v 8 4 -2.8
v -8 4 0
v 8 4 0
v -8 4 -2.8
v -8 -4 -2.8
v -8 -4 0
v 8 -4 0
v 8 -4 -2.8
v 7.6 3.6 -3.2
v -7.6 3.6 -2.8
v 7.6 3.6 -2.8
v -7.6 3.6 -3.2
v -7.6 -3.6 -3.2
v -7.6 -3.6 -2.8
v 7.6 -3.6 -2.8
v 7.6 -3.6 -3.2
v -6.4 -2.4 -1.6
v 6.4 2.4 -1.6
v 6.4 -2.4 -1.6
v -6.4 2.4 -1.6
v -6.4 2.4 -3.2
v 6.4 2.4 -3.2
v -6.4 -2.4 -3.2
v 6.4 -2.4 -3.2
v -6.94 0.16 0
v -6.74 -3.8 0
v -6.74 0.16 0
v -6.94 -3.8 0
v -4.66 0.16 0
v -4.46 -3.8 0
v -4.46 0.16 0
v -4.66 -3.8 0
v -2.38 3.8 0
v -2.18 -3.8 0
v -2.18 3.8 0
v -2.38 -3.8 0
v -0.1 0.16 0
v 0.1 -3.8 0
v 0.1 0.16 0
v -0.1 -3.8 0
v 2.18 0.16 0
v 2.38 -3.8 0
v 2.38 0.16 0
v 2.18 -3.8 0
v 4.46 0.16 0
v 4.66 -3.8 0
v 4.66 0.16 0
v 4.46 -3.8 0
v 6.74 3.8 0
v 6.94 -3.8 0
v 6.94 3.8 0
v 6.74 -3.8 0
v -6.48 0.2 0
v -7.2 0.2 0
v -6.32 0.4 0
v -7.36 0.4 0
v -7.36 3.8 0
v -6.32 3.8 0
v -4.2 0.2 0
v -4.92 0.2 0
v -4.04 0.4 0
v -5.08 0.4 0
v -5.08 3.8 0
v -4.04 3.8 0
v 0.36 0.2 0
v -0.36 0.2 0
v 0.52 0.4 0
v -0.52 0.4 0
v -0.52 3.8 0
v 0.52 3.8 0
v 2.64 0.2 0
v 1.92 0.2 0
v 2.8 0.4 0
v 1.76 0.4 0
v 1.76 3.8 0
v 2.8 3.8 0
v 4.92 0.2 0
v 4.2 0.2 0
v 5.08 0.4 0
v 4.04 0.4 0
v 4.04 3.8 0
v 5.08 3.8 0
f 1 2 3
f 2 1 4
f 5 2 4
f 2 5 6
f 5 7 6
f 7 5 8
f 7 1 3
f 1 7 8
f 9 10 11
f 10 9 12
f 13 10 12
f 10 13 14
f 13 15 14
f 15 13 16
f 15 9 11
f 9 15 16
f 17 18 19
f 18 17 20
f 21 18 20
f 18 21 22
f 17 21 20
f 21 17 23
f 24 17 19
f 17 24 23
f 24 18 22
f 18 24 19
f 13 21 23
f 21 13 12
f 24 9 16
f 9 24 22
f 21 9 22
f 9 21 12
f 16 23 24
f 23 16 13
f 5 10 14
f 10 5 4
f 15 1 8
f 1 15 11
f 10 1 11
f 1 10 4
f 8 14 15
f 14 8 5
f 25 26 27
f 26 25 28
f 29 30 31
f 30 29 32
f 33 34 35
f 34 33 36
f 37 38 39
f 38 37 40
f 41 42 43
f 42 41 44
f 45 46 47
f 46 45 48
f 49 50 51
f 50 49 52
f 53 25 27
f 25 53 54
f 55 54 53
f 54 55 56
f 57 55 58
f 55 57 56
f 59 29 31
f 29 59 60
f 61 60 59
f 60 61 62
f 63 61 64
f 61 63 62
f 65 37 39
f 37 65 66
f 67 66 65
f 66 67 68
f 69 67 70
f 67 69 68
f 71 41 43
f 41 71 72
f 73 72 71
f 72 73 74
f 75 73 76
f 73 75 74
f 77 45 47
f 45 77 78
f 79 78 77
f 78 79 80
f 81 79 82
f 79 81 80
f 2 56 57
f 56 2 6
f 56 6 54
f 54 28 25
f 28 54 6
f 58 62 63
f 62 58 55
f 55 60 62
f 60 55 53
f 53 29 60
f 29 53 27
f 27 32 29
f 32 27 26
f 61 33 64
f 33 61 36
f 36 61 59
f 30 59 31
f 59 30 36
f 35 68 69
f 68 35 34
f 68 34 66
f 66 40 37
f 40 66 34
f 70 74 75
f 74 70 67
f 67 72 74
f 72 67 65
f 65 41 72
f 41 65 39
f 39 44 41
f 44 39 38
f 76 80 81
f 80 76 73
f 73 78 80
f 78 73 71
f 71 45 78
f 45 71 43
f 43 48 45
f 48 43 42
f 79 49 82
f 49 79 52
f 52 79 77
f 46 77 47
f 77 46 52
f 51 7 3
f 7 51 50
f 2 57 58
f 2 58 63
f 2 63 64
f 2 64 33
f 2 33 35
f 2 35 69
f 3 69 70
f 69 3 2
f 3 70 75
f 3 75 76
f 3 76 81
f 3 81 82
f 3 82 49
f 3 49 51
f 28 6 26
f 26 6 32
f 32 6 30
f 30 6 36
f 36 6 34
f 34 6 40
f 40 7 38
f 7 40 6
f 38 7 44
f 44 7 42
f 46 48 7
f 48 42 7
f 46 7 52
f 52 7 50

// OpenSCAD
// file: ../p/box5.scad
use <../lib.scad>
function ldraw_lib__box5() = [
// 0 Box with 5 Faces and All Edges
// 0 Name: box5.dat
// 0 Author: James Jessiman
// 0 !LDRAW_ORG Primitive UPDATE 2012-01
// 0 !LICENSE Licensed under CC BY 2.0 and CC BY 4.0 : see CAreadme.txt
// 
// 0 BFC CERTIFY CCW
  [0,"BFC","CERTIFY"],
  [0,"BFC","CCW"],
// 
// 0 !HISTORY 2002-04-03 [sbliss] Modified for BFC compliance
// 0 !HISTORY 2002-04-25 [PTadmin] Official Update 2002-02
// 0 !HISTORY 2007-06-24 [PTadmin] Header formatted for Contributor Agreement
// 0 !HISTORY 2008-07-01 [PTadmin] Official Update 2008-01
// 0 !HISTORY 2012-02-16 [Philo] Changed to CCW
// 0 !HISTORY 2012-03-30 [PTadmin] Official Update 2012-01
// 
// 
// 2 24 1 1 1 -1 1 1
  [2,24,1,1,1,-1,1,1],
// 2 24 -1 1 1 -1 1 -1
  [2,24,-1,1,1,-1,1,-1],
// 2 24 -1 1 -1 1 1 -1
  [2,24,-1,1,-1,1,1,-1],
// 2 24 1 1 -1 1 1 1
  [2,24,1,1,-1,1,1,1],
// 2 24 1 0 1 -1 0 1
  [2,24,1,0,1,-1,0,1],
// 2 24 -1 0 1 -1 0 -1
  [2,24,-1,0,1,-1,0,-1],
// 2 24 -1 0 -1 1 0 -1
  [2,24,-1,0,-1,1,0,-1],
// 2 24 1 0 -1 1 0 1
  [2,24,1,0,-1,1,0,1],
// 2 24 1 0 1 1 1 1
  [2,24,1,0,1,1,1,1],
// 2 24 -1 0 1 -1 1 1
  [2,24,-1,0,1,-1,1,1],
// 2 24 1 0 -1 1 1 -1
  [2,24,1,0,-1,1,1,-1],
// 2 24 -1 0 -1 -1 1 -1
  [2,24,-1,0,-1,-1,1,-1],
// 4 16 -1 1 1 1 1 1 1 1 -1 -1 1 -1
  [4,16,-1,1,1,1,1,1,1,1,-1,-1,1,-1],
// 4 16 -1 1 1 -1 0 1 1 0 1 1 1 1
  [4,16,-1,1,1,-1,0,1,1,0,1,1,1,1],
// 4 16 -1 1 -1 -1 0 -1 -1 0 1 -1 1 1
  [4,16,-1,1,-1,-1,0,-1,-1,0,1,-1,1,1],
// 4 16 1 1 -1 1 0 -1 -1 0 -1 -1 1 -1
  [4,16,1,1,-1,1,0,-1,-1,0,-1,-1,1,-1],
// 4 16 1 1 1 1 0 1 1 0 -1 1 1 -1
  [4,16,1,1,1,1,0,1,1,0,-1,1,1,-1],
];
module ldraw_lib__box5(step=0, col=false, unit=2/5, alt=false, line=0.2, solid=!$preview)
    makepoly(ldraw_lib__box5(), step=step, col=col, unit=unit, alt=alt, line=line, solid=solid);
ldraw_lib__box5(line=0.2);
// file: ../p/box4.scad
use <../lib.scad>
function ldraw_lib__box4() = [
// 0 Box with 4 Faces (2 Parallel Pairs) and All Edges
// 0 Name: box4.dat
// 0 Author: James Jessiman
// 0 !LDRAW_ORG Primitive UPDATE 2012-01
// 0 !LICENSE Licensed under CC BY 2.0 and CC BY 4.0 : see CAreadme.txt
// 
// 0 BFC CERTIFY CCW
  [0,"BFC","CERTIFY"],
  [0,"BFC","CCW"],
// 
// 0 !HISTORY 2002-04-03 [sbliss] Modified for BFC compliance
// 0 !HISTORY 2002-04-25 [PTadmin] Official Update 2002-02
// 0 !HISTORY 2007-06-24 [PTadmin] Header formatted for Contributor Agreement
// 0 !HISTORY 2008-07-01 [PTadmin] Official Update 2008-01
// 0 !HISTORY 2012-02-16 [Philo] Changed to CCW
// 0 !HISTORY 2012-03-30 [PTadmin] Official Update 2012-01
// 
// 
// 2 24 1 1 1 -1 1 1
  [2,24,1,1,1,-1,1,1],
// 2 24 -1 1 1 -1 1 -1
  [2,24,-1,1,1,-1,1,-1],
// 2 24 -1 1 -1 1 1 -1
  [2,24,-1,1,-1,1,1,-1],
// 2 24 1 1 -1 1 1 1
  [2,24,1,1,-1,1,1,1],
// 2 24 1 0 1 -1 0 1
  [2,24,1,0,1,-1,0,1],
// 2 24 -1 0 1 -1 0 -1
  [2,24,-1,0,1,-1,0,-1],
// 2 24 -1 0 -1 1 0 -1
  [2,24,-1,0,-1,1,0,-1],
// 2 24 1 0 -1 1 0 1
  [2,24,1,0,-1,1,0,1],
// 2 24 1 0 1 1 1 1
  [2,24,1,0,1,1,1,1],
// 2 24 -1 0 1 -1 1 1
  [2,24,-1,0,1,-1,1,1],
// 2 24 1 0 -1 1 1 -1
  [2,24,1,0,-1,1,1,-1],
// 2 24 -1 0 -1 -1 1 -1
  [2,24,-1,0,-1,-1,1,-1],
// 4 16 -1 1 1 -1 0 1 1 0 1 1 1 1
  [4,16,-1,1,1,-1,0,1,1,0,1,1,1,1],
// 4 16 -1 1 -1 -1 0 -1 -1 0 1 -1 1 1
  [4,16,-1,1,-1,-1,0,-1,-1,0,1,-1,1,1],
// 4 16 1 1 -1 1 0 -1 -1 0 -1 -1 1 -1
  [4,16,1,1,-1,1,0,-1,-1,0,-1,-1,1,-1],
// 4 16 1 1 1 1 0 1 1 0 -1 1 1 -1
  [4,16,1,1,1,1,0,1,1,0,-1,1,1,-1],
];
module ldraw_lib__box4(step=0, col=false, unit=2/5, alt=false, line=0.2, solid=!$preview)
    makepoly(ldraw_lib__box4(), step=step, col=col, unit=unit, alt=alt, line=line, solid=solid);
ldraw_lib__box4(line=0.2);
// file: s/3069bs01.scad
use <../../lib.scad>
use <../../p/box4.scad>
use <../../p/box5.scad>
function ldraw_lib__s__3069bs01() = [
// 0 ~Tile  1 x  2 with Groove without Top Face
// 0 Name: s\3069bs01.dat
// 0 Author: Santeri Piippo [arezey]
// 0 !LDRAW_ORG Subpart UPDATE 2010-02
// 0 !LICENSE Licensed under CC BY 2.0 and CC BY 4.0 : see CAreadme.txt
// 
// 0 BFC CERTIFY CCW
  [0,"BFC","CERTIFY"],
  [0,"BFC","CCW"],
// 
// 0 !HISTORY 2010-07-05 [PTadmin] Official Update 2010-02
// 
// 
// 1 16 0 0 0 20 0 0 0 7 0 0 0 10 box4.dat
  [1,16,0,0,0,20,0,0,0,7,0,0,0,10, ldraw_lib__box4()],
// 1 16 0 7 0 19 0 0 0 1 0 0 0 9 box4.dat
  [1,16,0,7,0,19,0,0,0,1,0,0,0,9, ldraw_lib__box4()],
// 0 BFC INVERTNEXT
  [0,"BFC","INVERTNEXT"],
// 1 16 0 8 0 16 0 0 0 -4 0 0 0 6 box5.dat
  [1,16,0,8,0,16,0,0,0,-4,0,0,0,6, ldraw_lib__box5()],
// 4 16 -19 8 9 -16 8 6 -16 8 -6 -19 8 -9
  [4,16,-19,8,9,-16,8,6,-16,8,-6,-19,8,-9],
// 4 16 19 8 -9 16 8 -6 16 8 6 19 8 9
  [4,16,19,8,-9,16,8,-6,16,8,6,19,8,9],
// 4 16 19 8 9 16 8 6 -16 8 6 -19 8 9
  [4,16,19,8,9,16,8,6,-16,8,6,-19,8,9],
// 4 16 -19 8 -9 -16 8 -6 16 8 -6 19 8 -9
  [4,16,-19,8,-9,-16,8,-6,16,8,-6,19,8,-9],
// 4 16 -20 7 10 -19 7 9 -19 7 -9 -20 7 -10
  [4,16,-20,7,10,-19,7,9,-19,7,-9,-20,7,-10],
// 4 16 20 7 -10 19 7 -9 19 7 9 20 7 10
  [4,16,20,7,-10,19,7,-9,19,7,9,20,7,10],
// 4 16 20 7 10 19 7 9 -19 7 9 -20 7 10
  [4,16,20,7,10,19,7,9,-19,7,9,-20,7,10],
// 4 16 -20 7 -10 -19 7 -9 19 7 -9 20 7 -10
  [4,16,-20,7,-10,-19,7,-9,19,7,-9,20,7,-10],
// 0 //
];
module ldraw_lib__s__3069bs01(step=0, col=false, unit=2/5, alt=false, line=0.2, solid=!$preview)
    makepoly(ldraw_lib__s__3069bs01(), step=step, col=col, unit=unit, alt=alt, line=line, solid=solid);
ldraw_lib__s__3069bs01(line=0.2);
// main file
use <../lib.scad>
use <s/3069bs01.scad>
function ldraw_lib__3069bp0j() = [
// 0 Tile  1 x  2 with Piano Keys Pattern
// 0 Name: 3069bp0j.dat
// 0 Author: Vincent Messenet [Cheenzo]
// 0 !LDRAW_ORG Part UPDATE 2020-02
// 0 !LICENSE Licensed under CC BY 2.0 and CC BY 4.0 : see CAreadme.txt
// 
// 0 BFC CERTIFY CCW
  [0,"BFC","CERTIFY"],
  [0,"BFC","CCW"],
// 
// 0 !KEYWORDS BrickLink 3069bpb761, Set 10273, Set 41400, Set 43175
// 
// 0 !HISTORY 2020-09-05 [PTadmin] Official Update 2020-02
// 
// 
// 1 16 0 0 0 1 0 0 0 1 0 0 0 1 s\3069bs01.dat
  [1,16,0,0,0,1,0,0,0,1,0,0,0,1, ldraw_lib__s__3069bs01()],
// 
// 4 72 -16.85 0 -9.5 -16.85 0 .4 -17.35 0 .4 -17.35 0 -9.5
  [4,72,-16.85,0,-9.5,-16.85,0,.4,-17.35,0,.4,-17.35,0,-9.5],
// 4 72 -11.65 0 .4 -11.65 0 -9.5 -11.15 0 -9.5 -11.15 0 .4
  [4,72,-11.65,0,.4,-11.65,0,-9.5,-11.15,0,-9.5,-11.15,0,.4],
// 4 72 -5.45 0 -9.5 -5.45 0 9.5 -5.95 0 9.5 -5.95 0 -9.5
  [4,72,-5.45,0,-9.5,-5.45,0,9.5,-5.95,0,9.5,-5.95,0,-9.5],
// 4 72 -.25 0 -9.5 .25 0 -9.5 .25 0 .4 -.25 0 .4
  [4,72,-.25,0,-9.5,.25,0,-9.5,.25,0,.4,-.25,0,.4],
// 4 72 5.45 0 -9.5 5.95 0 -9.5 5.95 0 .4 5.45 0 .4
  [4,72,5.45,0,-9.5,5.95,0,-9.5,5.95,0,.4,5.45,0,.4],
// 4 72 11.15 0 -9.5 11.65 0 -9.5 11.65 0 .4 11.15 0 .4
  [4,72,11.15,0,-9.5,11.65,0,-9.5,11.65,0,.4,11.15,0,.4],
// 4 72 17.35 0 9.5 16.85 0 9.5 16.85 0 -9.5 17.35 0 -9.5
  [4,72,17.35,0,9.5,16.85,0,9.5,16.85,0,-9.5,17.35,0,-9.5],
// 4 0 -18 0 .5 -17.35 0 .4 -16.85 0 .4 -16.2 0 .5
  [4,0,-18,0,.5,-17.35,0,.4,-16.85,0,.4,-16.2,0,.5],
// 4 0 -18 0 .5 -16.2 0 .5 -15.8 0 1 -18.4 0 1
  [4,0,-18,0,.5,-16.2,0,.5,-15.8,0,1,-18.4,0,1],
// 4 0 -18.4 0 1 -15.8 0 1 -15.8 0 9.5 -18.4 0 9.5
  [4,0,-18.4,0,1,-15.8,0,1,-15.8,0,9.5,-18.4,0,9.5],
// 4 0 -11.65 0 .4 -11.15 0 .4 -10.5 0 .5 -12.3 0 .5
  [4,0,-11.65,0,.4,-11.15,0,.4,-10.5,0,.5,-12.3,0,.5],
// 4 0 -12.3 0 .5 -10.5 0 .5 -10.1 0 1 -12.7 0 1
  [4,0,-12.3,0,.5,-10.5,0,.5,-10.1,0,1,-12.7,0,1],
// 4 0 -12.7 0 1 -10.1 0 1 -10.1 0 9.5 -12.7 0 9.5
  [4,0,-12.7,0,1,-10.1,0,1,-10.1,0,9.5,-12.7,0,9.5],
// 4 0 -.9 0 .5 -.25 0 .4 .25 0 .4 .9 0 .5
  [4,0,-.9,0,.5,-.25,0,.4,.25,0,.4,.9,0,.5],
// 4 0 -.9 0 .5 .9 0 .5 1.3 0 1 -1.3 0 1
  [4,0,-.9,0,.5,.9,0,.5,1.3,0,1,-1.3,0,1],
// 4 0 1.3 0 9.5 -1.3 0 9.5 -1.3 0 1 1.3 0 1
  [4,0,1.3,0,9.5,-1.3,0,9.5,-1.3,0,1,1.3,0,1],
// 4 0 4.8 0 .5 5.45 0 .4 5.95 0 .4 6.6 0 .5
  [4,0,4.8,0,.5,5.45,0,.4,5.95,0,.4,6.6,0,.5],
// 4 0 4.8 0 .5 6.6 0 .5 7 0 1 4.4 0 1
  [4,0,4.8,0,.5,6.6,0,.5,7,0,1,4.4,0,1],
// 4 0 4.4 0 1 7 0 1 7 0 9.5 4.4 0 9.5
  [4,0,4.4,0,1,7,0,1,7,0,9.5,4.4,0,9.5],
// 4 0 11.15 0 .4 11.65 0 .4 12.3 0 .5 10.5 0 .5
  [4,0,11.15,0,.4,11.65,0,.4,12.3,0,.5,10.5,0,.5],
// 4 0 10.5 0 .5 12.3 0 .5 12.7 0 1 10.1 0 1
  [4,0,10.5,0,.5,12.3,0,.5,12.7,0,1,10.1,0,1],
// 4 0 10.1 0 1 12.7 0 1 12.7 0 9.5 10.1 0 9.5
  [4,0,10.1,0,1,12.7,0,1,12.7,0,9.5,10.1,0,9.5],
// 4 16 -18.4 0 1 -18.4 0 9.5 -20 0 10 -20 0 -10
  [4,16,-18.4,0,1,-18.4,0,9.5,-20,0,10,-20,0,-10],
// 3 16 -18.4 0 1 -20 0 -10 -18 0 .5
  [3,16,-18.4,0,1,-20,0,-10,-18,0,.5],
// 4 16 -20 0 -10 -17.35 0 -9.5 -17.35 0 .4 -18 0 .5
  [4,16,-20,0,-10,-17.35,0,-9.5,-17.35,0,.4,-18,0,.5],
// 4 16 -12.7 0 1 -12.7 0 9.5 -15.8 0 9.5 -15.8 0 1
  [4,16,-12.7,0,1,-12.7,0,9.5,-15.8,0,9.5,-15.8,0,1],
// 4 16 -12.3 0 .5 -12.7 0 1 -15.8 0 1 -16.2 0 .5
  [4,16,-12.3,0,.5,-12.7,0,1,-15.8,0,1,-16.2,0,.5],
// 4 16 -12.3 0 .5 -16.2 0 .5 -16.85 0 .4 -11.65 0 .4
  [4,16,-12.3,0,.5,-16.2,0,.5,-16.85,0,.4,-11.65,0,.4],
// 4 16 -11.65 0 -9.5 -11.65 0 .4 -16.85 0 .4 -16.85 0 -9.5
  [4,16,-11.65,0,-9.5,-11.65,0,.4,-16.85,0,.4,-16.85,0,-9.5],
// 4 16 -5.95 0 9.5 -10.1 0 9.5 -10.1 0 1 -5.95 0 -9.5
  [4,16,-5.95,0,9.5,-10.1,0,9.5,-10.1,0,1,-5.95,0,-9.5],
// 3 16 -5.95 0 -9.5 -10.1 0 1 -10.5 0 .5
  [3,16,-5.95,0,-9.5,-10.1,0,1,-10.5,0,.5],
// 4 16 -11.15 0 .4 -11.15 0 -9.5 -5.95 0 -9.5 -10.5 0 .5
  [4,16,-11.15,0,.4,-11.15,0,-9.5,-5.95,0,-9.5,-10.5,0,.5],
// 4 16 -1.3 0 1 -1.3 0 9.5 -5.45 0 9.5 -5.45 0 -9.5
  [4,16,-1.3,0,1,-1.3,0,9.5,-5.45,0,9.5,-5.45,0,-9.5],
// 3 16 -1.3 0 1 -5.45 0 -9.5 -.9 0 .5
  [3,16,-1.3,0,1,-5.45,0,-9.5,-.9,0,.5],
// 4 16 -5.45 0 -9.5 -.25 0 -9.5 -.25 0 .4 -.9 0 .5
  [4,16,-5.45,0,-9.5,-.25,0,-9.5,-.25,0,.4,-.9,0,.5],
// 4 16 4.4 0 1 4.4 0 9.5 1.3 0 9.5 1.3 0 1
  [4,16,4.4,0,1,4.4,0,9.5,1.3,0,9.5,1.3,0,1],
// 4 16 4.8 0 .5 4.4 0 1 1.3 0 1 .9 0 .5
  [4,16,4.8,0,.5,4.4,0,1,1.3,0,1,.9,0,.5],
// 4 16 5.45 0 .4 4.8 0 .5 .9 0 .5 .25 0 .4
  [4,16,5.45,0,.4,4.8,0,.5,.9,0,.5,.25,0,.4],
// 4 16 5.45 0 -9.5 5.45 0 .4 .25 0 .4 .25 0 -9.5
  [4,16,5.45,0,-9.5,5.45,0,.4,.25,0,.4,.25,0,-9.5],
// 4 16 10.1 0 1 10.1 0 9.5 7 0 9.5 7 0 1
  [4,16,10.1,0,1,10.1,0,9.5,7,0,9.5,7,0,1],
// 4 16 10.5 0 .5 10.1 0 1 7 0 1 6.6 0 .5
  [4,16,10.5,0,.5,10.1,0,1,7,0,1,6.6,0,.5],
// 4 16 10.5 0 .5 6.6 0 .5 5.95 0 .4 11.15 0 .4
  [4,16,10.5,0,.5,6.6,0,.5,5.95,0,.4,11.15,0,.4],
// 4 16 11.15 0 -9.5 11.15 0 .4 5.95 0 .4 5.95 0 -9.5
  [4,16,11.15,0,-9.5,11.15,0,.4,5.95,0,.4,5.95,0,-9.5],
// 4 16 16.85 0 9.5 12.7 0 9.5 12.7 0 1 16.85 0 -9.5
  [4,16,16.85,0,9.5,12.7,0,9.5,12.7,0,1,16.85,0,-9.5],
// 3 16 16.85 0 -9.5 12.7 0 1 12.3 0 .5
  [3,16,16.85,0,-9.5,12.7,0,1,12.3,0,.5],
// 4 16 11.65 0 .4 11.65 0 -9.5 16.85 0 -9.5 12.3 0 .5
  [4,16,11.65,0,.4,11.65,0,-9.5,16.85,0,-9.5,12.3,0,.5],
// 4 16 20 0 10 17.35 0 9.5 17.35 0 -9.5 20 0 -10
  [4,16,20,0,10,17.35,0,9.5,17.35,0,-9.5,20,0,-10],
// 3 16 -20 0 10 -18.4 0 9.5 -15.8 0 9.5
  [3,16,-20,0,10,-18.4,0,9.5,-15.8,0,9.5],
// 3 16 -20 0 10 -15.8 0 9.5 -12.7 0 9.5
  [3,16,-20,0,10,-15.8,0,9.5,-12.7,0,9.5],
// 3 16 -20 0 10 -12.7 0 9.5 -10.1 0 9.5
  [3,16,-20,0,10,-12.7,0,9.5,-10.1,0,9.5],
// 3 16 -20 0 10 -10.1 0 9.5 -5.95 0 9.5
  [3,16,-20,0,10,-10.1,0,9.5,-5.95,0,9.5],
// 3 16 -20 0 10 -5.95 0 9.5 -5.45 0 9.5
  [3,16,-20,0,10,-5.95,0,9.5,-5.45,0,9.5],
// 3 16 -20 0 10 -5.45 0 9.5 -1.3 0 9.5
  [3,16,-20,0,10,-5.45,0,9.5,-1.3,0,9.5],
// 4 16 -1.3 0 9.5 1.3 0 9.5 20 0 10 -20 0 10
  [4,16,-1.3,0,9.5,1.3,0,9.5,20,0,10,-20,0,10],
// 3 16 20 0 10 1.3 0 9.5 4.4 0 9.5
  [3,16,20,0,10,1.3,0,9.5,4.4,0,9.5],
// 3 16 20 0 10 4.4 0 9.5 7 0 9.5
  [3,16,20,0,10,4.4,0,9.5,7,0,9.5],
// 3 16 20 0 10 7 0 9.5 10.1 0 9.5
  [3,16,20,0,10,7,0,9.5,10.1,0,9.5],
// 3 16 20 0 10 10.1 0 9.5 12.7 0 9.5
  [3,16,20,0,10,10.1,0,9.5,12.7,0,9.5],
// 3 16 20 0 10 12.7 0 9.5 16.85 0 9.5
  [3,16,20,0,10,12.7,0,9.5,16.85,0,9.5],
// 3 16 20 0 10 16.85 0 9.5 17.35 0 9.5
  [3,16,20,0,10,16.85,0,9.5,17.35,0,9.5],
// 3 16 -17.35 0 -9.5 -20 0 -10 -16.85 0 -9.5
  [3,16,-17.35,0,-9.5,-20,0,-10,-16.85,0,-9.5],
// 3 16 -16.85 0 -9.5 -20 0 -10 -11.65 0 -9.5
  [3,16,-16.85,0,-9.5,-20,0,-10,-11.65,0,-9.5],
// 3 16 -11.65 0 -9.5 -20 0 -10 -11.15 0 -9.5
  [3,16,-11.65,0,-9.5,-20,0,-10,-11.15,0,-9.5],
// 3 16 -11.15 0 -9.5 -20 0 -10 -5.95 0 -9.5
  [3,16,-11.15,0,-9.5,-20,0,-10,-5.95,0,-9.5],
// 3 16 -5.95 0 -9.5 -20 0 -10 -5.45 0 -9.5
  [3,16,-5.95,0,-9.5,-20,0,-10,-5.45,0,-9.5],
// 3 16 -5.45 0 -9.5 -20 0 -10 -.25 0 -9.5
  [3,16,-5.45,0,-9.5,-20,0,-10,-.25,0,-9.5],
// 4 16 -20 0 -10 20 0 -10 .25 0 -9.5 -.25 0 -9.5
  [4,16,-20,0,-10,20,0,-10,.25,0,-9.5,-.25,0,-9.5],
// 3 16 .25 0 -9.5 20 0 -10 5.45 0 -9.5
  [3,16,.25,0,-9.5,20,0,-10,5.45,0,-9.5],
// 3 16 5.45 0 -9.5 20 0 -10 5.95 0 -9.5
  [3,16,5.45,0,-9.5,20,0,-10,5.95,0,-9.5],
// 3 16 11.65 0 -9.5 11.15 0 -9.5 20 0 -10
  [3,16,11.65,0,-9.5,11.15,0,-9.5,20,0,-10],
// 3 16 11.15 0 -9.5 5.95 0 -9.5 20 0 -10
  [3,16,11.15,0,-9.5,5.95,0,-9.5,20,0,-10],
// 3 16 11.65 0 -9.5 20 0 -10 16.85 0 -9.5
  [3,16,11.65,0,-9.5,20,0,-10,16.85,0,-9.5],
// 3 16 16.85 0 -9.5 20 0 -10 17.35 0 -9.5
  [3,16,16.85,0,-9.5,20,0,-10,17.35,0,-9.5],
];
module ldraw_lib__3069bp0j(step=0, col=false, unit=2/5, alt=false, line=0.2, solid=!$preview)
    makepoly(ldraw_lib__3069bp0j(), step=step, col=col, unit=unit, alt=alt, line=line, solid=solid);
ldraw_lib__3069bp0j(line=0.2);
